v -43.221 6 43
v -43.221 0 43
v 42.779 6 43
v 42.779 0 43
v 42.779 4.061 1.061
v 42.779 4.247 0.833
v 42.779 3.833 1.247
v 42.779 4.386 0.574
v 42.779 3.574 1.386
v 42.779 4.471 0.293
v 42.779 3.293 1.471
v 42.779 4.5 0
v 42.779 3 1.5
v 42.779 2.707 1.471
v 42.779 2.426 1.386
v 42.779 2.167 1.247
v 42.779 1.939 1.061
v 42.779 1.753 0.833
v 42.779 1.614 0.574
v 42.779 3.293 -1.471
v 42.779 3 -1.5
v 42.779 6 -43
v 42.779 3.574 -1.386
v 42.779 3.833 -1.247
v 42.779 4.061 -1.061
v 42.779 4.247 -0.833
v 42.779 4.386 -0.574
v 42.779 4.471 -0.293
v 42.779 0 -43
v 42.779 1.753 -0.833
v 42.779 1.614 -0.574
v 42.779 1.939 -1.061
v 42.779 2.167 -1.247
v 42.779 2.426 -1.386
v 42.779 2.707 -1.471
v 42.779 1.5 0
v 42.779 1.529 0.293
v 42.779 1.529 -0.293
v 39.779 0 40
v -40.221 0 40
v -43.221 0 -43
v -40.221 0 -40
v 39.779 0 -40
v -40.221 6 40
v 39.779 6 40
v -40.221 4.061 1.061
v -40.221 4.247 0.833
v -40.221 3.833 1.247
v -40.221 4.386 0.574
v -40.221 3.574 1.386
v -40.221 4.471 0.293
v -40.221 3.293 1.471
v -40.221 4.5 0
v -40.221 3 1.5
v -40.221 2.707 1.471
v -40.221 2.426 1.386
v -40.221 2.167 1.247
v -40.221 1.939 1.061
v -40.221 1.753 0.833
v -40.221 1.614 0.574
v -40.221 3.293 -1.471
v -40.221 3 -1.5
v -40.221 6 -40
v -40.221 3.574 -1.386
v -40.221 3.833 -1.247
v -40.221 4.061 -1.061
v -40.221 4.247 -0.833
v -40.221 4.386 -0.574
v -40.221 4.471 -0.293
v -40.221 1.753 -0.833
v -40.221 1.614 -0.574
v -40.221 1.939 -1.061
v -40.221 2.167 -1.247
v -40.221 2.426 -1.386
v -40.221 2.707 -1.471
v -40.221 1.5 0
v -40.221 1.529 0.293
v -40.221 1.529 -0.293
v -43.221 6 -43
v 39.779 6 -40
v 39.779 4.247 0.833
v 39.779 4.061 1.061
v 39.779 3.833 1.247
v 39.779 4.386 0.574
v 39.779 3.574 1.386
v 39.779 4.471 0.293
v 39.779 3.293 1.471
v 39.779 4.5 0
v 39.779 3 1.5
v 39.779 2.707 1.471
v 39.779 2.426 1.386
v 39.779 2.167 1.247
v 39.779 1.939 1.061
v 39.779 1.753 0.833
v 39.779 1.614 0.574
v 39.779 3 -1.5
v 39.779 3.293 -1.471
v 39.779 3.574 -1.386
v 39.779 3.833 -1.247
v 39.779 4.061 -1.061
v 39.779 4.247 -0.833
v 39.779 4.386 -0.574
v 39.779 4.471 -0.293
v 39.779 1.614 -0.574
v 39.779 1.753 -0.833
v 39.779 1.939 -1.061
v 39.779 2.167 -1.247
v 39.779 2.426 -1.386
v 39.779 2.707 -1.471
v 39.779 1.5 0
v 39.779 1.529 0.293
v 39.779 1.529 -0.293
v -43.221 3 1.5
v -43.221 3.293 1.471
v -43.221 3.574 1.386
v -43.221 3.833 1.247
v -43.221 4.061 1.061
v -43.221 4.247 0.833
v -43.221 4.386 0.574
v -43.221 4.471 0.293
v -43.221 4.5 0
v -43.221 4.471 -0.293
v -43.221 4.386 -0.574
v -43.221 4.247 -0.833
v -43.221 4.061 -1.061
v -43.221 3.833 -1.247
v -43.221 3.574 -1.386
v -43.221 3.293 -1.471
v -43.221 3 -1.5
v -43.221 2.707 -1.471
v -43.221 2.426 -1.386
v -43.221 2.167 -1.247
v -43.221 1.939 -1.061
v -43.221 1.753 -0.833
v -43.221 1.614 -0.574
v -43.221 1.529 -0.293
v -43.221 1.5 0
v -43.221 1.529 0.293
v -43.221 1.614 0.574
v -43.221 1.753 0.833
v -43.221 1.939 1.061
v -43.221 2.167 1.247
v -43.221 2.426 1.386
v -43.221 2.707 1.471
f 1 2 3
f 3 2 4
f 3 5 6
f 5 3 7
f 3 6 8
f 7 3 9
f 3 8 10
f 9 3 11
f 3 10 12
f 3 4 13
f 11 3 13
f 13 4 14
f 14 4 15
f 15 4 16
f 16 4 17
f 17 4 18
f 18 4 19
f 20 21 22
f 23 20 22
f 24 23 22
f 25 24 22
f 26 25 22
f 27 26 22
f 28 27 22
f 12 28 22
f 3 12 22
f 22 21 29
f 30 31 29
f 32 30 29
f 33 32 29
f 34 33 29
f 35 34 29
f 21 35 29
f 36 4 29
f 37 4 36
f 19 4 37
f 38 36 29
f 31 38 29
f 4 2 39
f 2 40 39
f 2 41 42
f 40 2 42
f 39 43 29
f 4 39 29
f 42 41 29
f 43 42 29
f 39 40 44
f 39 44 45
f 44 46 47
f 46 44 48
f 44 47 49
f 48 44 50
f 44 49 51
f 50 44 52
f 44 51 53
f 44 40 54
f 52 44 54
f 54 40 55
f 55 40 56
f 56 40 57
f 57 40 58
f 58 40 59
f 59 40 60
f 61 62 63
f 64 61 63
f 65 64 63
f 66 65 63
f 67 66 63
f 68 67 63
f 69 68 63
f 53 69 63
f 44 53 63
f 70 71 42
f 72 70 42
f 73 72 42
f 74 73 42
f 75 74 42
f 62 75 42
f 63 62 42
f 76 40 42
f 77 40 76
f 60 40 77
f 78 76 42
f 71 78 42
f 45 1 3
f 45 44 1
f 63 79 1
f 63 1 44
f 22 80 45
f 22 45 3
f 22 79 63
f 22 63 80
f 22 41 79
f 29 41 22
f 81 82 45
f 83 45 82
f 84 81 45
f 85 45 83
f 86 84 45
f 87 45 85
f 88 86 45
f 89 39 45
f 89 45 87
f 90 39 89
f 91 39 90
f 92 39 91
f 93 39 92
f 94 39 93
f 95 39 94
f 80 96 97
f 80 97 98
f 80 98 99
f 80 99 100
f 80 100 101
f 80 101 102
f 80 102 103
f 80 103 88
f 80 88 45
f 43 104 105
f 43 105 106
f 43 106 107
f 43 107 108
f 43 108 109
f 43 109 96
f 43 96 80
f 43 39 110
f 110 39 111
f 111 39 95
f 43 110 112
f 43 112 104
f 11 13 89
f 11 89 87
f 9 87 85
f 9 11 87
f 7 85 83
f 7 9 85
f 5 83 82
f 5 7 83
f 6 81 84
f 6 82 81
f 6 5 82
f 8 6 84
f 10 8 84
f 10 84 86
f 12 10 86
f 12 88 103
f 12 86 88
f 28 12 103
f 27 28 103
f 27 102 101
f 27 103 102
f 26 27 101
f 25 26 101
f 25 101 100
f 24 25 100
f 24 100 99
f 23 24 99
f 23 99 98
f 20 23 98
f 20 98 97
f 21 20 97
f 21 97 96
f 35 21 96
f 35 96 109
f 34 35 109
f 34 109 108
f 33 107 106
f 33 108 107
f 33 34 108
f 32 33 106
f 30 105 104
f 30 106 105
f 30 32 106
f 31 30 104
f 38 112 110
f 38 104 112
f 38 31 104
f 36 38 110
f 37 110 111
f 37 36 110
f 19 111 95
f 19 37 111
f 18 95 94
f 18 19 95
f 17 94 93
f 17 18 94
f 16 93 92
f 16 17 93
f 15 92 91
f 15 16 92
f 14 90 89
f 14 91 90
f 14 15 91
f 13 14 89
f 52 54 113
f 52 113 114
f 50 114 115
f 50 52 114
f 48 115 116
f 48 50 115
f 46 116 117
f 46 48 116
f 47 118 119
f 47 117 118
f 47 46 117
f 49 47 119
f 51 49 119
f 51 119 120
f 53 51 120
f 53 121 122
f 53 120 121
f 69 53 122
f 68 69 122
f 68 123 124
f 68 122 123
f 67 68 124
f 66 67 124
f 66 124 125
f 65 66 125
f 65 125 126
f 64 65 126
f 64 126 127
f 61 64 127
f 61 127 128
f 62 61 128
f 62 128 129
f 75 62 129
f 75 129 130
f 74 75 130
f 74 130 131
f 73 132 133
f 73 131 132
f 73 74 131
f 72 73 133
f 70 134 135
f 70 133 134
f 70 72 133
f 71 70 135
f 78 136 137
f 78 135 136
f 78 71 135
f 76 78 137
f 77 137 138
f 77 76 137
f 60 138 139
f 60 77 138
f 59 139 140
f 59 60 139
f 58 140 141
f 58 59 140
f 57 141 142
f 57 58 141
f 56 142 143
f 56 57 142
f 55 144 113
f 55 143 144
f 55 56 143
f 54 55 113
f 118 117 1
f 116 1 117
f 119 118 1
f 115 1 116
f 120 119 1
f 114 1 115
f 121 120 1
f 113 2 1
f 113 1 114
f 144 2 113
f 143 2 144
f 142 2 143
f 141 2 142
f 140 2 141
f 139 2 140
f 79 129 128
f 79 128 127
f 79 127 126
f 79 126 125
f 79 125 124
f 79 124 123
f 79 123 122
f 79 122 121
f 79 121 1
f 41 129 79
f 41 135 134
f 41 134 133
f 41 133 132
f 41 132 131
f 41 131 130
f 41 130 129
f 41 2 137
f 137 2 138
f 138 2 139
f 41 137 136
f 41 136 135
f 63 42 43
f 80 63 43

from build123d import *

# Parameters (mm, degrees)
SKETCH1_W               = 86
SKETCH1_H               = 86
SKETCH1_W_2             = 80
SKETCH1_H_2             = 80
EXTRUDE_THIN1_DEPTH     = 6
CUT_EXTRUDE1_DEPTH      = 94.669632219
CUT_EXTRUDE1_DEPTH_BACK = 94.669632219
SKETCH2_R               = 1.5


with BuildPart() as part:
    # Sketch1 → Extrude-Thin1 (new body)
    with BuildSketch(Plane(origin=(0, 0, 0), x_dir=(1, 0, 0), z_dir=(0, 1, 0))):
        with Locations((-0.220557938, 0)):
            Rectangle(SKETCH1_W, SKETCH1_H)
        with Locations((-0.220557938, 0)):
            Rectangle(SKETCH1_W_2, SKETCH1_H_2, mode=Mode.SUBTRACT)
    extrude(amount=EXTRUDE_THIN1_DEPTH)

    # Sketch2 → Cut-Extrude1 (cut, two sides: drawn at the far end of the back side and taken through both)
    with BuildSketch(Plane.ZY.offset(-39.779442062).offset(-CUT_EXTRUDE1_DEPTH_BACK)):
        with Locations((0, 3)):
            Circle(SKETCH2_R)
    extrude(amount=CUT_EXTRUDE1_DEPTH + CUT_EXTRUDE1_DEPTH_BACK, mode=Mode.SUBTRACT)


solid = part.part
